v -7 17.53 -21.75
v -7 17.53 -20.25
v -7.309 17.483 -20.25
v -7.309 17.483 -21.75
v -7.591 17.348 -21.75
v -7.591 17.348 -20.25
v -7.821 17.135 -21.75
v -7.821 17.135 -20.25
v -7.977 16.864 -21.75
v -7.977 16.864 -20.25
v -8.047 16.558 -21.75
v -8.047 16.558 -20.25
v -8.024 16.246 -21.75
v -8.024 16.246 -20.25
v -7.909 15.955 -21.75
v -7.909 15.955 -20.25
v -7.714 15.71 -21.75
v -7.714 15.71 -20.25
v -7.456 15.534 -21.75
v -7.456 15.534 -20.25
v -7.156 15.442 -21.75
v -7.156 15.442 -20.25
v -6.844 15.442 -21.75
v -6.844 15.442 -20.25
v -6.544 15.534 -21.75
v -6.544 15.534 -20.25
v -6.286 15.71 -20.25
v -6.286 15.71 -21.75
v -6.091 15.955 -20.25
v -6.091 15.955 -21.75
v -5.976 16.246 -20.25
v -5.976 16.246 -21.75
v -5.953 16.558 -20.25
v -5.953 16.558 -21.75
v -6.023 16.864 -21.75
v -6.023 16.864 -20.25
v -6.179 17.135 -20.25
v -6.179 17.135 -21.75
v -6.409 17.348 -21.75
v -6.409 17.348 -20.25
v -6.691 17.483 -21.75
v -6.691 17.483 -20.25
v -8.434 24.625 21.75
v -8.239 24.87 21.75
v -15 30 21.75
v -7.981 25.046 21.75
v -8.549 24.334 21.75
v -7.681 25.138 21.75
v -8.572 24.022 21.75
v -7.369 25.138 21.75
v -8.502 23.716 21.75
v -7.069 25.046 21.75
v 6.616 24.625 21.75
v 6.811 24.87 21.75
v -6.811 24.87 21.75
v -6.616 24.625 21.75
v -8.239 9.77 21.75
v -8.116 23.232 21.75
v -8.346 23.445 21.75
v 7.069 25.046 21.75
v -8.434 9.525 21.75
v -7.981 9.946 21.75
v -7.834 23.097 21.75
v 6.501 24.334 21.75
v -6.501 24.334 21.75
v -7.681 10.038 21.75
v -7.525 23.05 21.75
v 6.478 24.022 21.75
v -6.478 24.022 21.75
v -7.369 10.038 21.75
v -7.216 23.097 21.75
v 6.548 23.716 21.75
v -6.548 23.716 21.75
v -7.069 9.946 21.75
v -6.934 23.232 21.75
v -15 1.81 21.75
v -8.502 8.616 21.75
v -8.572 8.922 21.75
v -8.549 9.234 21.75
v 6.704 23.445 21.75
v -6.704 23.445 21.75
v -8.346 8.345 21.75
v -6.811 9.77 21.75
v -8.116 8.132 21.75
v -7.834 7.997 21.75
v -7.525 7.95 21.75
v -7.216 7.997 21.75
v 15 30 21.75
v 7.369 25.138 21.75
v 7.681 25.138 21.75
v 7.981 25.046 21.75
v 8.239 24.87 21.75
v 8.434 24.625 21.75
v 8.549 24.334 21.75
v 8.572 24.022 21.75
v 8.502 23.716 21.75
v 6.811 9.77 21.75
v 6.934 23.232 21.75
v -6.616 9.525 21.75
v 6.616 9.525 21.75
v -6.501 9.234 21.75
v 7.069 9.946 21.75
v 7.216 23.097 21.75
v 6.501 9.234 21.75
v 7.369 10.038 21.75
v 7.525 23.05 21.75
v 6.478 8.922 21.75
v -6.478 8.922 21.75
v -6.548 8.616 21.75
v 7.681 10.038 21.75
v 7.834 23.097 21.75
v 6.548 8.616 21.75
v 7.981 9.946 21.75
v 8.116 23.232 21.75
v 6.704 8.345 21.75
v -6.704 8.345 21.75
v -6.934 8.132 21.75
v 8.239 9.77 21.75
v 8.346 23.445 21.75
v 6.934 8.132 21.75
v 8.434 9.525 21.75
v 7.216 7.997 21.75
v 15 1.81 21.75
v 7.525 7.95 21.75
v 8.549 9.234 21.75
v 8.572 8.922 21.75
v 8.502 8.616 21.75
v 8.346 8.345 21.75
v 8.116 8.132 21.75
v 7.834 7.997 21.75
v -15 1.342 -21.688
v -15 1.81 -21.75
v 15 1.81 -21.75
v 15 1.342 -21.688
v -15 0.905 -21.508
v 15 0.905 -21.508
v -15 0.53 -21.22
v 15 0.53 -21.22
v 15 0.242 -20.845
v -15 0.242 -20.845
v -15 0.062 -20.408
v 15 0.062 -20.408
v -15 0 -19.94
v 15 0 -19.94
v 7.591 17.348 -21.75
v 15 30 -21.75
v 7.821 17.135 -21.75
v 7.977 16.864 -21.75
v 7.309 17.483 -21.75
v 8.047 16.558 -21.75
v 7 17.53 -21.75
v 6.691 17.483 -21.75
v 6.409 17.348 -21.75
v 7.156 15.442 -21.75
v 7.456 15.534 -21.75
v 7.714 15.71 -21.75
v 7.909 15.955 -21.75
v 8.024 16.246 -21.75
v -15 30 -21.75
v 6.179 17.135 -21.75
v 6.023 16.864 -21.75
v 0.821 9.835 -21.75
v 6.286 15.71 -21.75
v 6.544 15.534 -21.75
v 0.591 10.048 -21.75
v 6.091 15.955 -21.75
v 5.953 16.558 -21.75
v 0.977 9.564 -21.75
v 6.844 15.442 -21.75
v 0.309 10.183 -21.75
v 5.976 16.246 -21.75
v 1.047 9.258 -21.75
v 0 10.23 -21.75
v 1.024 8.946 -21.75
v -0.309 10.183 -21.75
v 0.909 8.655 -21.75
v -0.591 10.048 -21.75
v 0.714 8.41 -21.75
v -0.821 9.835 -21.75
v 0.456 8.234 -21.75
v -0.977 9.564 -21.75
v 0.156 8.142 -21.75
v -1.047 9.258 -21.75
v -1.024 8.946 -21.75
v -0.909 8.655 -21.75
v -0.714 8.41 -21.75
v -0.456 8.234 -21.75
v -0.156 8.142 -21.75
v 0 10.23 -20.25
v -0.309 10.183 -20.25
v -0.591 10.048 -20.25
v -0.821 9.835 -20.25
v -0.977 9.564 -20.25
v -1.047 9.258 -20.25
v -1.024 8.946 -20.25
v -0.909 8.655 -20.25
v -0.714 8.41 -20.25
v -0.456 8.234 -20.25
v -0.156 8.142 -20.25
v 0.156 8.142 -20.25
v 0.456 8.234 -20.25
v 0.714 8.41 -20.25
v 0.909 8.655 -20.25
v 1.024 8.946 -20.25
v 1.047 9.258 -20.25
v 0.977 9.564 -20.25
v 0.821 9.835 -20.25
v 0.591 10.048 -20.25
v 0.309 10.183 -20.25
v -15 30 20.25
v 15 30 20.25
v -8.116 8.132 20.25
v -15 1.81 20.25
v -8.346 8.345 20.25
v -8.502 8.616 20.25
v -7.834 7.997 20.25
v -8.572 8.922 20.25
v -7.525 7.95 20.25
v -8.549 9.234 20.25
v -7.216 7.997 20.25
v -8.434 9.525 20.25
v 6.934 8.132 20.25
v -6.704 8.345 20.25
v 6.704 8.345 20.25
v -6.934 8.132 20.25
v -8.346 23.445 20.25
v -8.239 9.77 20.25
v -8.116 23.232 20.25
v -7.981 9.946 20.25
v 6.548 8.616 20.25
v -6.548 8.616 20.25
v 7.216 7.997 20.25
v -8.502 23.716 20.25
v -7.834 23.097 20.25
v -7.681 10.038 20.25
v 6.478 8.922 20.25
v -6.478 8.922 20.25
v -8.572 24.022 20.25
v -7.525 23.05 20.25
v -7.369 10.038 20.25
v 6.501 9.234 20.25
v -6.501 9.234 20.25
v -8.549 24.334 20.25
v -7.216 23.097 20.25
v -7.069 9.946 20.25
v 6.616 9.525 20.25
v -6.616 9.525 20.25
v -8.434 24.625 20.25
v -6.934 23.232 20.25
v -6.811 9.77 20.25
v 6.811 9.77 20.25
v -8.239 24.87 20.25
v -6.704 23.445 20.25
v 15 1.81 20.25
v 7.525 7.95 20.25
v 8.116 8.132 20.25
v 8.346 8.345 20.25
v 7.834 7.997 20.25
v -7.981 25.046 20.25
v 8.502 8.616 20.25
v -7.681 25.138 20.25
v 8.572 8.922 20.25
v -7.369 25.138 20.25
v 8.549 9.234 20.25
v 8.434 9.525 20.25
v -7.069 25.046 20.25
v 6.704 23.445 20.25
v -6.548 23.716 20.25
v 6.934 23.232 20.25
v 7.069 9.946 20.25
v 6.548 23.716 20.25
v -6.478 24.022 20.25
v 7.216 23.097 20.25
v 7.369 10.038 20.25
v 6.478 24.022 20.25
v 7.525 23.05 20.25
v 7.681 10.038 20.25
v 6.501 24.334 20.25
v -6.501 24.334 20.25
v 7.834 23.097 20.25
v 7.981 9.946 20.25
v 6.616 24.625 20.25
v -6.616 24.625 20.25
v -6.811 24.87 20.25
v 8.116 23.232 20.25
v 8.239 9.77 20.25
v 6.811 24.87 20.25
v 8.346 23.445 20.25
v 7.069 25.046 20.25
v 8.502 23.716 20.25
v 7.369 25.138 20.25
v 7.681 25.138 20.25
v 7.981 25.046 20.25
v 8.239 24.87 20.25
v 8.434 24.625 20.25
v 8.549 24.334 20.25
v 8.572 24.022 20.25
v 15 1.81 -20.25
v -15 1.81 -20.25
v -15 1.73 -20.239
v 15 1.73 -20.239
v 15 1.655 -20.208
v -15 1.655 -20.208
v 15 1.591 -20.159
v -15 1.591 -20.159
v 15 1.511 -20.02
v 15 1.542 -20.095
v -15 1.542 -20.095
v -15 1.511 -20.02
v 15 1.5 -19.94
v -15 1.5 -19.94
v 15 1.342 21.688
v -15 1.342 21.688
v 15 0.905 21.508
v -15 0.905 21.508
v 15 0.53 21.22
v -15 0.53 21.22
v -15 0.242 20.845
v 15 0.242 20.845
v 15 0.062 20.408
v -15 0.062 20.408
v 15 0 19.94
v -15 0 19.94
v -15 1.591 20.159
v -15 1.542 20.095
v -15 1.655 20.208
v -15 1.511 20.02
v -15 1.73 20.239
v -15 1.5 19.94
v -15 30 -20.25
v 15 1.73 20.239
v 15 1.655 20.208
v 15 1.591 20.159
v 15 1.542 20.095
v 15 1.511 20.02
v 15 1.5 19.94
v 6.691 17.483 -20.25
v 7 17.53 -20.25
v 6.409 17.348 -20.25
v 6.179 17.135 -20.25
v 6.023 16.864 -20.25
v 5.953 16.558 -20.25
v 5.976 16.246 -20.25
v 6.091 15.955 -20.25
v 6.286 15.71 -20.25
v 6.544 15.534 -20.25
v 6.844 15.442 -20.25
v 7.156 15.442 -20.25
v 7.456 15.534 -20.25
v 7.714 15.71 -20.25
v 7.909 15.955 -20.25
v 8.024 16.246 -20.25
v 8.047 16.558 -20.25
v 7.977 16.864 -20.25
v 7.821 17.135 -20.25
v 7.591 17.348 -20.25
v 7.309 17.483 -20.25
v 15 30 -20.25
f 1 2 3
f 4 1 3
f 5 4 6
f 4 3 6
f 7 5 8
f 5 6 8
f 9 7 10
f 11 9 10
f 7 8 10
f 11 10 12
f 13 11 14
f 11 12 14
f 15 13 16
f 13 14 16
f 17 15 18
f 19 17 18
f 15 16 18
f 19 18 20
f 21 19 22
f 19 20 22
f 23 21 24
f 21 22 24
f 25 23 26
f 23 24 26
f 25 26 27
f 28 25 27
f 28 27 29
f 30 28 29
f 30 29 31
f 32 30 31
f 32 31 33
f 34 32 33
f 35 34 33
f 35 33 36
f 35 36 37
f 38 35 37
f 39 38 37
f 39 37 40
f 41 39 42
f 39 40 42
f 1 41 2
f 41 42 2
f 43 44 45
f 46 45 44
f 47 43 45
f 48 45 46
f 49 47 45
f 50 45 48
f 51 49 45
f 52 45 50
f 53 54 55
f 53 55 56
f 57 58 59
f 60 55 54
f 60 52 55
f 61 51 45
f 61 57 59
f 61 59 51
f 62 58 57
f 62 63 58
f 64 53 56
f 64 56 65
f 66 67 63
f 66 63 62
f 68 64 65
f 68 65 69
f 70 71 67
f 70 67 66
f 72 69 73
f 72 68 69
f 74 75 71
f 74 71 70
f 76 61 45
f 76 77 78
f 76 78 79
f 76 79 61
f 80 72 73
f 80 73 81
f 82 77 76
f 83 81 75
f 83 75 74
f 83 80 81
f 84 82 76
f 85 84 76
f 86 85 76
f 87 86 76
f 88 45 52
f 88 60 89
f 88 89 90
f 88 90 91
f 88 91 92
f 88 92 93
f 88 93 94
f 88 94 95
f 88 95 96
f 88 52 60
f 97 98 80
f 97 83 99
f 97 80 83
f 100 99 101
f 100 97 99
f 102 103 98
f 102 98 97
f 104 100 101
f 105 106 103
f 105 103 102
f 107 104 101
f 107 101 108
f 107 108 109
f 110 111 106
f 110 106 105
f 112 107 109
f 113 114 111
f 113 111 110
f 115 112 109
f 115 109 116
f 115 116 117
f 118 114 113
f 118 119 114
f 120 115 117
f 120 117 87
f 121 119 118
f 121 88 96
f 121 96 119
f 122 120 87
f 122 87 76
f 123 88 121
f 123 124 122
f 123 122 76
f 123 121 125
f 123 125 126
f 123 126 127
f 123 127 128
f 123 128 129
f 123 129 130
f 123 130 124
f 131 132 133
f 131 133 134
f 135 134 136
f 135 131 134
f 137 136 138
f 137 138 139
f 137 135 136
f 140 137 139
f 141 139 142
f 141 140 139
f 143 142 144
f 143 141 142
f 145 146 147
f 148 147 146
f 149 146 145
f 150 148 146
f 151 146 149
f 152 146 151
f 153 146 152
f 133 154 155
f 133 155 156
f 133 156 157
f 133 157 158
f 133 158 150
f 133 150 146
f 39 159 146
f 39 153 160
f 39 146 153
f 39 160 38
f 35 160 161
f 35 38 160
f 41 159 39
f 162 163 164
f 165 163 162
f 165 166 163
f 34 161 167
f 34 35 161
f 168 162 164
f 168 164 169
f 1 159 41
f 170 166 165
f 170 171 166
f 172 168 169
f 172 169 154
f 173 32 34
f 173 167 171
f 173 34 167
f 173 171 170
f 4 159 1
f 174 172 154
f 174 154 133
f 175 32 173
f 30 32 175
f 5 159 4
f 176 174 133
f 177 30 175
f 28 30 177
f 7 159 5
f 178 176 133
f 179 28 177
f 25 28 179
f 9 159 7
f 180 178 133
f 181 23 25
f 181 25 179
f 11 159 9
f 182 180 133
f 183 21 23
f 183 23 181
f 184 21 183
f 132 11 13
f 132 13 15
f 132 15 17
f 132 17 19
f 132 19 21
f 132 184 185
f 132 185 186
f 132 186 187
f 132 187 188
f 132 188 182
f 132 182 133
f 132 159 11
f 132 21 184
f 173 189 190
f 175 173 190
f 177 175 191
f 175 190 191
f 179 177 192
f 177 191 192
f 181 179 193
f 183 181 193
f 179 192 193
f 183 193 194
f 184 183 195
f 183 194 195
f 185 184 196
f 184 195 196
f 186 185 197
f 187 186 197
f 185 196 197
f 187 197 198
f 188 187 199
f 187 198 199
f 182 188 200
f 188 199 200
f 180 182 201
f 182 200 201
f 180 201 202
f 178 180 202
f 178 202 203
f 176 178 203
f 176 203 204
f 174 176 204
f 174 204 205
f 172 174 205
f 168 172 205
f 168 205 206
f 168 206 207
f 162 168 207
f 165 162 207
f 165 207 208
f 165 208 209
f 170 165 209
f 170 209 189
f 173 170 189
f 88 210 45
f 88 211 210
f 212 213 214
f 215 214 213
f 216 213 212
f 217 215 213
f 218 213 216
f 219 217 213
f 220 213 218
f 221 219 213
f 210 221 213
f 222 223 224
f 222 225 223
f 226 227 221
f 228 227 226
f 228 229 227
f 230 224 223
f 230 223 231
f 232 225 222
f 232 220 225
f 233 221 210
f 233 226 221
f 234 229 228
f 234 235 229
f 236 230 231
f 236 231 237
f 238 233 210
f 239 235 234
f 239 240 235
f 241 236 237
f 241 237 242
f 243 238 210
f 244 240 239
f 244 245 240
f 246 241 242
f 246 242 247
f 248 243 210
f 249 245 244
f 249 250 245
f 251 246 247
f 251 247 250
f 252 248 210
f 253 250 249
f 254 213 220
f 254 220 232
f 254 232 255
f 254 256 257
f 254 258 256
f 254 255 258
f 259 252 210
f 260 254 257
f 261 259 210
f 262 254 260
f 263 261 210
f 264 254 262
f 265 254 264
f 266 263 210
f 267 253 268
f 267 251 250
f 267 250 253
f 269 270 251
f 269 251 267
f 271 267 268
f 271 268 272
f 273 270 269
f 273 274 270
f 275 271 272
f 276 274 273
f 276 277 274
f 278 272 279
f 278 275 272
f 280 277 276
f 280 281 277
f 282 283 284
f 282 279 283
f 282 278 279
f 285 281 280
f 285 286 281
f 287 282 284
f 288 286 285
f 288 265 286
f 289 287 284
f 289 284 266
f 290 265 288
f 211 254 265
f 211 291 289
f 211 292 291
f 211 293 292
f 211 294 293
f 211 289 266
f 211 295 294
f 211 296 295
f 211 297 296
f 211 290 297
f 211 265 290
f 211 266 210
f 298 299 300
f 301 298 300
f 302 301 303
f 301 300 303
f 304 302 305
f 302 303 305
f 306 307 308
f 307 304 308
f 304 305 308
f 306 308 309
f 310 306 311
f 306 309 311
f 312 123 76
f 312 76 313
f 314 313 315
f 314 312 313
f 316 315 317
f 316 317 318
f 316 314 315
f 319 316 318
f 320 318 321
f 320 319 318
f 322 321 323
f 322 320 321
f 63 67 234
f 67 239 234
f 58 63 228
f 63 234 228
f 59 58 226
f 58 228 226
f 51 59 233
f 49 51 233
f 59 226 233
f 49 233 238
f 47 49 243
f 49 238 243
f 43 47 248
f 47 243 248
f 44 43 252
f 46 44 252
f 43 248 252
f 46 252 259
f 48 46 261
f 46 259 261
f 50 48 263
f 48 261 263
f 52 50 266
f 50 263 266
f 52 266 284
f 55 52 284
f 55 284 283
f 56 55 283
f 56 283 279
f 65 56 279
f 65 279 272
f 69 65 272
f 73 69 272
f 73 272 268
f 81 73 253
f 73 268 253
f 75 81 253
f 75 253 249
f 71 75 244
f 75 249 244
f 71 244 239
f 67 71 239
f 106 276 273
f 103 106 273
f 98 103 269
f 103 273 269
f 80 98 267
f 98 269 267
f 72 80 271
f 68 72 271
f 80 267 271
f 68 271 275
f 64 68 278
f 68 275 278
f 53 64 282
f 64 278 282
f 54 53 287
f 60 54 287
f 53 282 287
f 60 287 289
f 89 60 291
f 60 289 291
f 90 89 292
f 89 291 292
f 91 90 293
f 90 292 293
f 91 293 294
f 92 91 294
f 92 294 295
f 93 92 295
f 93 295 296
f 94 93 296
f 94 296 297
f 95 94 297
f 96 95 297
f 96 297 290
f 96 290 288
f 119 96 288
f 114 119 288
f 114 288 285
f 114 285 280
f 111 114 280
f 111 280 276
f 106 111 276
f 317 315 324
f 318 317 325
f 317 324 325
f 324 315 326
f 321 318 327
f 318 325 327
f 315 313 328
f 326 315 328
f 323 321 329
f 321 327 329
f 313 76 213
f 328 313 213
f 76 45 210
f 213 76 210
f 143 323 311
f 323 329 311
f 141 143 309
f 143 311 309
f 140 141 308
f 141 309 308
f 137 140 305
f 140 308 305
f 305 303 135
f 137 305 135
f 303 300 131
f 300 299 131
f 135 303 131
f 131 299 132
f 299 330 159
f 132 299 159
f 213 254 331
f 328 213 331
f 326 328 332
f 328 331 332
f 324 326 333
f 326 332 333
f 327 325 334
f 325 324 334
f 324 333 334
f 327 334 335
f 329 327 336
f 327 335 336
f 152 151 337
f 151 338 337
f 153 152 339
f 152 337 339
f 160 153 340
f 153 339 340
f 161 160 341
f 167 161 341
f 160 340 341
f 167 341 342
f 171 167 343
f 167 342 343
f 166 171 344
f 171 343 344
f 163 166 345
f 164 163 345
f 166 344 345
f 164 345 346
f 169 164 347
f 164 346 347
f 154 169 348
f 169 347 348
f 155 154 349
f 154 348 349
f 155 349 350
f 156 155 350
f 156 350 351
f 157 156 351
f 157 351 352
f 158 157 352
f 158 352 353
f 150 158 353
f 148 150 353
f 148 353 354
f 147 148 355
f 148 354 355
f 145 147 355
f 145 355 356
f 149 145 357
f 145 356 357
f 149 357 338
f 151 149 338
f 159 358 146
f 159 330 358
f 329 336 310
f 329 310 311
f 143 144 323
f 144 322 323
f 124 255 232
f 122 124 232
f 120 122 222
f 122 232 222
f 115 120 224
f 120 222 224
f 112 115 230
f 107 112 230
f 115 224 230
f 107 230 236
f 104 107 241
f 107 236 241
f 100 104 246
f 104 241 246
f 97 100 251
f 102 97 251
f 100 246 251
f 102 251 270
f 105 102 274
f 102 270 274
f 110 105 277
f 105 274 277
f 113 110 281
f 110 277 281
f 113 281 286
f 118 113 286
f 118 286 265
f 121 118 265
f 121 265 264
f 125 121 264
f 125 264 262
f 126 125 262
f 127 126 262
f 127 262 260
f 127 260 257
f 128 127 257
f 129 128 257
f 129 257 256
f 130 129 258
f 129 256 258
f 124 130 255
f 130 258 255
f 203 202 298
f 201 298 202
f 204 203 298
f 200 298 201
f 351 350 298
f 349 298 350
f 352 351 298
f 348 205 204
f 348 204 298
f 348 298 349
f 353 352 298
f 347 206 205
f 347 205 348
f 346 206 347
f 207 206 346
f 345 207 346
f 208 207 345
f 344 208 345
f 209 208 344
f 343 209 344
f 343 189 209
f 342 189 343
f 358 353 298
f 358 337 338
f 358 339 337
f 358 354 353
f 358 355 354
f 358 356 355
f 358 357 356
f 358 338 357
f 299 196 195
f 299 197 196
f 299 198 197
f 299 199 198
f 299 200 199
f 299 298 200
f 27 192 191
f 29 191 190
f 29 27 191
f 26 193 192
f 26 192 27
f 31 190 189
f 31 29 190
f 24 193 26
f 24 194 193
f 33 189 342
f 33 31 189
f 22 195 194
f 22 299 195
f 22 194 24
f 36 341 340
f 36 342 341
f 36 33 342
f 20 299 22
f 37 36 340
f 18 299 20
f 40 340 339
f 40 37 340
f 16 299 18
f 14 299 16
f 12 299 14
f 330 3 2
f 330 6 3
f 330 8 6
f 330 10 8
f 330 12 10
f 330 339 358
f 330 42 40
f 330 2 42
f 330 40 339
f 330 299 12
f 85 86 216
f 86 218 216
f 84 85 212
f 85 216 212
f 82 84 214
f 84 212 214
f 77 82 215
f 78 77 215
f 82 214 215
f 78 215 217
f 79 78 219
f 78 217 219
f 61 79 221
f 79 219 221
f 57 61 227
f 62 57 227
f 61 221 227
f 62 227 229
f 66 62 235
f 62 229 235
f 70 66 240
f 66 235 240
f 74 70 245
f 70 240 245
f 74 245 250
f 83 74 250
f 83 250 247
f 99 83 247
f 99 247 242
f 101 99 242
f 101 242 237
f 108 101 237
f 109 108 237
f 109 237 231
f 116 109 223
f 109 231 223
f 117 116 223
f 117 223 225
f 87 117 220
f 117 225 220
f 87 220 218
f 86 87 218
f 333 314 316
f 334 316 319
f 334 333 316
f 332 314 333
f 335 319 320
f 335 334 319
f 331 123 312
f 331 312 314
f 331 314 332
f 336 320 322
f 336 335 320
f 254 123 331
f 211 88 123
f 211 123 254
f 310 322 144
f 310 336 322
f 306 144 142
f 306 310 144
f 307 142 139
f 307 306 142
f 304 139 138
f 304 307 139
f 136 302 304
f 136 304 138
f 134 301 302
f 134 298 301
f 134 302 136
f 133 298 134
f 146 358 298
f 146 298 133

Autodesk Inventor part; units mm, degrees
ref_plane "YZ Plane" through (0, 0, 0) normal (1, 0, 0) x (0, 1, 0)
ref_plane "XZ Plane" through (0, 0, 0) normal (0, 1, 0) x (-1, 0, 0)
ref_plane "XY Plane" through (0, 0, 0) normal (0, 0, 1) x (1, 0, 0)
sketch "Sketch1" plane through (0, 0, 0) normal (0, 1, 0) x (-1, 0, 0)
  line L0 (15, 20.25) -> (-15, 20.25)
  line L1 (-15, 20.25) -> (-15, -20.25)
  line L2 (-15, -20.25) -> (15, -20.25)
  line L3 (15, -20.25) -> (15, 20.25)
  line L4 (15, 20.25) -> (-15, -20.25) construction
  line L5 (-15, 20.25) -> (15, -20.25) construction
  point P0 (0, 0)
  dimension "d0" = 30
  dimension "d1" = 40.5
extrude "Plate1" add sketch "Sketch1" along normal blind 1.5
sketch "Sketch2" plane through (15, 0, 21.75) normal (0, 0, -1) x (-1, 0, 0)
  line L0 (30, 0) -> (0, 0)
  line L1 (0, 0) -> (0, 30)
  line L2 (0, 30) -> (30, 30)
  line L3 (30, 30) -> (30, 0)
edge flange "Flange1" height 30 angle 90 thickness 1.5 bend radius 0.31 thickness toward (0, 0, -1) relief tear relief width 1.5 relief depth 0.75 corner gap 0.31 corner form 0 edges at (0, 1.5, 20.25) (0, 1.5, -20.25) wall of the first edge with corners at (-15, 0, 21.75) (15, 0, 21.75) (15, 30, 21.75) (-15, 30, 21.75)
bend "Bend1"
corner "Corner1"
sketch "Sketch3" plane through (-15, 30, 21.75) normal (0, 0, 1) x (1, 0, 0)
  circle A0 centre (22.525, -21) radius 0.7835 projected
  circle A1 centre (22.525, -5.9) radius 0.7835 projected
  circle A2 centre (7.475, -21) radius 0.7835 projected
  circle A3 centre (7.475, -5.9) radius 0.7835 projected
  ellipse E0 centre (22.952, 14.482) end of major axis (23.818, 15.348) minor radius 1 (24.07, 14.7056) -> (23.1756, 15.6) ccw projected
  line L0 (6.8244, 15.6) -> (23.1756, 15.6) projected
  ellipse E1 centre (7.048, 14.482) end of major axis (6.182, 15.348) minor radius 1 (6.8244, 15.6) -> (5.93, 14.7056) ccw projected
  line L1 (5.93, -21.6056) -> (5.93, 14.7056) projected
  ellipse E2 centre (7.048, -21.382) end of major axis (6.182, -22.248) minor radius 1 (5.93, -21.6056) -> (6.8244, -22.5) ccw projected
  line L2 (23.1756, -22.5) -> (6.8244, -22.5) projected
  ellipse E3 centre (22.952, -21.382) end of major axis (23.818, -22.248) minor radius 1 (23.1756, -22.5) -> (24.07, -21.6056) ccw projected
  line L3 (24.07, 14.7056) -> (24.07, -21.6056) projected
  circle A4 centre (7.475, -21) radius 0.7835 projected
  circle A5 centre (22.525, -21) radius 0.7835 projected
  circle A6 centre (7.475, -5.9) radius 0.7835 projected
  circle A7 centre (22.525, -5.9) radius 0.7835 projected
  circle A8 centre (7.475, 14.1) radius 0.7835 projected
  circle A9 centre (22.525, 14.1) radius 0.7835 projected
  circle A10 centre (15, 6.6) radius 6.4 projected
  point P0 (15, -30)
hole "Hole1" at (7.525, 24.1, 21.75) at (7.525, 9, 21.75) at (-7.525, 9, 21.75) at (-7.525, 24.1, 21.75) direction (0, 0, -1) diameter 2.1 depth 1.5
sketch "Sketch4" plane through (15, 30, -21.75) normal (0, 0, -1) x (-1, 0, 0)
  circle A0 centre (15, -20.82) radius 0.7835 projected
  circle A1 centre (8, -13.52) radius 0.7835 projected
  circle A2 centre (22, -13.52) radius 0.7835 projected
  circle A3 centre (7, -0.3) radius 0.7835 projected
  circle A4 centre (23, -0.3) radius 0.7835 projected
  line L0 (21.07, -22.22) -> (8.93, -22.22) projected
  line L1 (21.07, -22.22) -> (21.07, -21.5) projected
  arc A5 (23.07, -19.5) -> (21.07, -21.5) centre (23.07, -21.5) ccw projected
  line L2 (23.07, -19.5) -> (23.79, -19.5) projected
  line L3 (23.79, 12.6) -> (23.79, -19.5) projected
  line L4 (23.79, 12.6) -> (23.07, 12.6) projected
  arc A6 (21.07, 14.6) -> (23.07, 12.6) centre (23.07, 14.6) ccw projected
  line L5 (21.07, 14.6) -> (21.07, 15.32) projected
  line L6 (8.93, 15.32) -> (21.07, 15.32) projected
  line L7 (8.93, 15.32) -> (8.93, 14.6) projected
  arc A7 (6.93, 12.6) -> (8.93, 14.6) centre (6.93, 14.6) ccw projected
  line L8 (6.93, 12.6) -> (6.21, 12.6) projected
  line L9 (6.21, -19.5) -> (6.21, 12.6) projected
  line L10 (6.21, -19.5) -> (6.93, -19.5) projected
  arc A8 (8.93, -21.5) -> (6.93, -19.5) centre (6.93, -21.5) ccw projected
  line L11 (8.93, -21.5) -> (8.93, -22.22) projected
  circle A9 centre (15, 6.6) radius 6.4 projected
  point P0 (15, -30)
hole "Hole2" at (-7, 16.48, -21.75) at (7, 16.48, -21.75) at (0, 9.18, -21.75) direction (0, 0, 1) diameter 2.1 depth 1.5
equation "\"d18\" = Thickness"
equation "\"d25\" = Thickness"
equation "\"d2\" = Thickness"
equation "\"d3\" = BendReliefWidth"
equation "\"d4\" = BendReliefDepth"
equation "\"d5\" = MinimumRemnant"
equation "\"d6\" = TransitionRadius"
equation "\"d9\" = BendRadius"
equation "\"d10\" = CornerReliefSize"
equation "\"d11\" = GapSize"
equation "\"d12\" = JacobiRadiusSize"
equation "\"BendReliefWidth\" = Thickness"
equation "\"BendReliefDepth\" = 0.5 * Thickness"
equation "\"CornerReliefSize\" = 4 * Thickness"
equation "\"MinimumRemnant\" = 2 * Thickness"
equation "\"TransitionRadius\" = BendRadius"
equation "\"JacobiRadiusSize\" = BendRadius"
equation "\"GapSize\" = Thickness"
equation "\"Thickness\" = 1.5"
equation "\"BendRadius\" = 0.31"
properties part number "HWFrame" material "Aluminum 6061-AHC"
